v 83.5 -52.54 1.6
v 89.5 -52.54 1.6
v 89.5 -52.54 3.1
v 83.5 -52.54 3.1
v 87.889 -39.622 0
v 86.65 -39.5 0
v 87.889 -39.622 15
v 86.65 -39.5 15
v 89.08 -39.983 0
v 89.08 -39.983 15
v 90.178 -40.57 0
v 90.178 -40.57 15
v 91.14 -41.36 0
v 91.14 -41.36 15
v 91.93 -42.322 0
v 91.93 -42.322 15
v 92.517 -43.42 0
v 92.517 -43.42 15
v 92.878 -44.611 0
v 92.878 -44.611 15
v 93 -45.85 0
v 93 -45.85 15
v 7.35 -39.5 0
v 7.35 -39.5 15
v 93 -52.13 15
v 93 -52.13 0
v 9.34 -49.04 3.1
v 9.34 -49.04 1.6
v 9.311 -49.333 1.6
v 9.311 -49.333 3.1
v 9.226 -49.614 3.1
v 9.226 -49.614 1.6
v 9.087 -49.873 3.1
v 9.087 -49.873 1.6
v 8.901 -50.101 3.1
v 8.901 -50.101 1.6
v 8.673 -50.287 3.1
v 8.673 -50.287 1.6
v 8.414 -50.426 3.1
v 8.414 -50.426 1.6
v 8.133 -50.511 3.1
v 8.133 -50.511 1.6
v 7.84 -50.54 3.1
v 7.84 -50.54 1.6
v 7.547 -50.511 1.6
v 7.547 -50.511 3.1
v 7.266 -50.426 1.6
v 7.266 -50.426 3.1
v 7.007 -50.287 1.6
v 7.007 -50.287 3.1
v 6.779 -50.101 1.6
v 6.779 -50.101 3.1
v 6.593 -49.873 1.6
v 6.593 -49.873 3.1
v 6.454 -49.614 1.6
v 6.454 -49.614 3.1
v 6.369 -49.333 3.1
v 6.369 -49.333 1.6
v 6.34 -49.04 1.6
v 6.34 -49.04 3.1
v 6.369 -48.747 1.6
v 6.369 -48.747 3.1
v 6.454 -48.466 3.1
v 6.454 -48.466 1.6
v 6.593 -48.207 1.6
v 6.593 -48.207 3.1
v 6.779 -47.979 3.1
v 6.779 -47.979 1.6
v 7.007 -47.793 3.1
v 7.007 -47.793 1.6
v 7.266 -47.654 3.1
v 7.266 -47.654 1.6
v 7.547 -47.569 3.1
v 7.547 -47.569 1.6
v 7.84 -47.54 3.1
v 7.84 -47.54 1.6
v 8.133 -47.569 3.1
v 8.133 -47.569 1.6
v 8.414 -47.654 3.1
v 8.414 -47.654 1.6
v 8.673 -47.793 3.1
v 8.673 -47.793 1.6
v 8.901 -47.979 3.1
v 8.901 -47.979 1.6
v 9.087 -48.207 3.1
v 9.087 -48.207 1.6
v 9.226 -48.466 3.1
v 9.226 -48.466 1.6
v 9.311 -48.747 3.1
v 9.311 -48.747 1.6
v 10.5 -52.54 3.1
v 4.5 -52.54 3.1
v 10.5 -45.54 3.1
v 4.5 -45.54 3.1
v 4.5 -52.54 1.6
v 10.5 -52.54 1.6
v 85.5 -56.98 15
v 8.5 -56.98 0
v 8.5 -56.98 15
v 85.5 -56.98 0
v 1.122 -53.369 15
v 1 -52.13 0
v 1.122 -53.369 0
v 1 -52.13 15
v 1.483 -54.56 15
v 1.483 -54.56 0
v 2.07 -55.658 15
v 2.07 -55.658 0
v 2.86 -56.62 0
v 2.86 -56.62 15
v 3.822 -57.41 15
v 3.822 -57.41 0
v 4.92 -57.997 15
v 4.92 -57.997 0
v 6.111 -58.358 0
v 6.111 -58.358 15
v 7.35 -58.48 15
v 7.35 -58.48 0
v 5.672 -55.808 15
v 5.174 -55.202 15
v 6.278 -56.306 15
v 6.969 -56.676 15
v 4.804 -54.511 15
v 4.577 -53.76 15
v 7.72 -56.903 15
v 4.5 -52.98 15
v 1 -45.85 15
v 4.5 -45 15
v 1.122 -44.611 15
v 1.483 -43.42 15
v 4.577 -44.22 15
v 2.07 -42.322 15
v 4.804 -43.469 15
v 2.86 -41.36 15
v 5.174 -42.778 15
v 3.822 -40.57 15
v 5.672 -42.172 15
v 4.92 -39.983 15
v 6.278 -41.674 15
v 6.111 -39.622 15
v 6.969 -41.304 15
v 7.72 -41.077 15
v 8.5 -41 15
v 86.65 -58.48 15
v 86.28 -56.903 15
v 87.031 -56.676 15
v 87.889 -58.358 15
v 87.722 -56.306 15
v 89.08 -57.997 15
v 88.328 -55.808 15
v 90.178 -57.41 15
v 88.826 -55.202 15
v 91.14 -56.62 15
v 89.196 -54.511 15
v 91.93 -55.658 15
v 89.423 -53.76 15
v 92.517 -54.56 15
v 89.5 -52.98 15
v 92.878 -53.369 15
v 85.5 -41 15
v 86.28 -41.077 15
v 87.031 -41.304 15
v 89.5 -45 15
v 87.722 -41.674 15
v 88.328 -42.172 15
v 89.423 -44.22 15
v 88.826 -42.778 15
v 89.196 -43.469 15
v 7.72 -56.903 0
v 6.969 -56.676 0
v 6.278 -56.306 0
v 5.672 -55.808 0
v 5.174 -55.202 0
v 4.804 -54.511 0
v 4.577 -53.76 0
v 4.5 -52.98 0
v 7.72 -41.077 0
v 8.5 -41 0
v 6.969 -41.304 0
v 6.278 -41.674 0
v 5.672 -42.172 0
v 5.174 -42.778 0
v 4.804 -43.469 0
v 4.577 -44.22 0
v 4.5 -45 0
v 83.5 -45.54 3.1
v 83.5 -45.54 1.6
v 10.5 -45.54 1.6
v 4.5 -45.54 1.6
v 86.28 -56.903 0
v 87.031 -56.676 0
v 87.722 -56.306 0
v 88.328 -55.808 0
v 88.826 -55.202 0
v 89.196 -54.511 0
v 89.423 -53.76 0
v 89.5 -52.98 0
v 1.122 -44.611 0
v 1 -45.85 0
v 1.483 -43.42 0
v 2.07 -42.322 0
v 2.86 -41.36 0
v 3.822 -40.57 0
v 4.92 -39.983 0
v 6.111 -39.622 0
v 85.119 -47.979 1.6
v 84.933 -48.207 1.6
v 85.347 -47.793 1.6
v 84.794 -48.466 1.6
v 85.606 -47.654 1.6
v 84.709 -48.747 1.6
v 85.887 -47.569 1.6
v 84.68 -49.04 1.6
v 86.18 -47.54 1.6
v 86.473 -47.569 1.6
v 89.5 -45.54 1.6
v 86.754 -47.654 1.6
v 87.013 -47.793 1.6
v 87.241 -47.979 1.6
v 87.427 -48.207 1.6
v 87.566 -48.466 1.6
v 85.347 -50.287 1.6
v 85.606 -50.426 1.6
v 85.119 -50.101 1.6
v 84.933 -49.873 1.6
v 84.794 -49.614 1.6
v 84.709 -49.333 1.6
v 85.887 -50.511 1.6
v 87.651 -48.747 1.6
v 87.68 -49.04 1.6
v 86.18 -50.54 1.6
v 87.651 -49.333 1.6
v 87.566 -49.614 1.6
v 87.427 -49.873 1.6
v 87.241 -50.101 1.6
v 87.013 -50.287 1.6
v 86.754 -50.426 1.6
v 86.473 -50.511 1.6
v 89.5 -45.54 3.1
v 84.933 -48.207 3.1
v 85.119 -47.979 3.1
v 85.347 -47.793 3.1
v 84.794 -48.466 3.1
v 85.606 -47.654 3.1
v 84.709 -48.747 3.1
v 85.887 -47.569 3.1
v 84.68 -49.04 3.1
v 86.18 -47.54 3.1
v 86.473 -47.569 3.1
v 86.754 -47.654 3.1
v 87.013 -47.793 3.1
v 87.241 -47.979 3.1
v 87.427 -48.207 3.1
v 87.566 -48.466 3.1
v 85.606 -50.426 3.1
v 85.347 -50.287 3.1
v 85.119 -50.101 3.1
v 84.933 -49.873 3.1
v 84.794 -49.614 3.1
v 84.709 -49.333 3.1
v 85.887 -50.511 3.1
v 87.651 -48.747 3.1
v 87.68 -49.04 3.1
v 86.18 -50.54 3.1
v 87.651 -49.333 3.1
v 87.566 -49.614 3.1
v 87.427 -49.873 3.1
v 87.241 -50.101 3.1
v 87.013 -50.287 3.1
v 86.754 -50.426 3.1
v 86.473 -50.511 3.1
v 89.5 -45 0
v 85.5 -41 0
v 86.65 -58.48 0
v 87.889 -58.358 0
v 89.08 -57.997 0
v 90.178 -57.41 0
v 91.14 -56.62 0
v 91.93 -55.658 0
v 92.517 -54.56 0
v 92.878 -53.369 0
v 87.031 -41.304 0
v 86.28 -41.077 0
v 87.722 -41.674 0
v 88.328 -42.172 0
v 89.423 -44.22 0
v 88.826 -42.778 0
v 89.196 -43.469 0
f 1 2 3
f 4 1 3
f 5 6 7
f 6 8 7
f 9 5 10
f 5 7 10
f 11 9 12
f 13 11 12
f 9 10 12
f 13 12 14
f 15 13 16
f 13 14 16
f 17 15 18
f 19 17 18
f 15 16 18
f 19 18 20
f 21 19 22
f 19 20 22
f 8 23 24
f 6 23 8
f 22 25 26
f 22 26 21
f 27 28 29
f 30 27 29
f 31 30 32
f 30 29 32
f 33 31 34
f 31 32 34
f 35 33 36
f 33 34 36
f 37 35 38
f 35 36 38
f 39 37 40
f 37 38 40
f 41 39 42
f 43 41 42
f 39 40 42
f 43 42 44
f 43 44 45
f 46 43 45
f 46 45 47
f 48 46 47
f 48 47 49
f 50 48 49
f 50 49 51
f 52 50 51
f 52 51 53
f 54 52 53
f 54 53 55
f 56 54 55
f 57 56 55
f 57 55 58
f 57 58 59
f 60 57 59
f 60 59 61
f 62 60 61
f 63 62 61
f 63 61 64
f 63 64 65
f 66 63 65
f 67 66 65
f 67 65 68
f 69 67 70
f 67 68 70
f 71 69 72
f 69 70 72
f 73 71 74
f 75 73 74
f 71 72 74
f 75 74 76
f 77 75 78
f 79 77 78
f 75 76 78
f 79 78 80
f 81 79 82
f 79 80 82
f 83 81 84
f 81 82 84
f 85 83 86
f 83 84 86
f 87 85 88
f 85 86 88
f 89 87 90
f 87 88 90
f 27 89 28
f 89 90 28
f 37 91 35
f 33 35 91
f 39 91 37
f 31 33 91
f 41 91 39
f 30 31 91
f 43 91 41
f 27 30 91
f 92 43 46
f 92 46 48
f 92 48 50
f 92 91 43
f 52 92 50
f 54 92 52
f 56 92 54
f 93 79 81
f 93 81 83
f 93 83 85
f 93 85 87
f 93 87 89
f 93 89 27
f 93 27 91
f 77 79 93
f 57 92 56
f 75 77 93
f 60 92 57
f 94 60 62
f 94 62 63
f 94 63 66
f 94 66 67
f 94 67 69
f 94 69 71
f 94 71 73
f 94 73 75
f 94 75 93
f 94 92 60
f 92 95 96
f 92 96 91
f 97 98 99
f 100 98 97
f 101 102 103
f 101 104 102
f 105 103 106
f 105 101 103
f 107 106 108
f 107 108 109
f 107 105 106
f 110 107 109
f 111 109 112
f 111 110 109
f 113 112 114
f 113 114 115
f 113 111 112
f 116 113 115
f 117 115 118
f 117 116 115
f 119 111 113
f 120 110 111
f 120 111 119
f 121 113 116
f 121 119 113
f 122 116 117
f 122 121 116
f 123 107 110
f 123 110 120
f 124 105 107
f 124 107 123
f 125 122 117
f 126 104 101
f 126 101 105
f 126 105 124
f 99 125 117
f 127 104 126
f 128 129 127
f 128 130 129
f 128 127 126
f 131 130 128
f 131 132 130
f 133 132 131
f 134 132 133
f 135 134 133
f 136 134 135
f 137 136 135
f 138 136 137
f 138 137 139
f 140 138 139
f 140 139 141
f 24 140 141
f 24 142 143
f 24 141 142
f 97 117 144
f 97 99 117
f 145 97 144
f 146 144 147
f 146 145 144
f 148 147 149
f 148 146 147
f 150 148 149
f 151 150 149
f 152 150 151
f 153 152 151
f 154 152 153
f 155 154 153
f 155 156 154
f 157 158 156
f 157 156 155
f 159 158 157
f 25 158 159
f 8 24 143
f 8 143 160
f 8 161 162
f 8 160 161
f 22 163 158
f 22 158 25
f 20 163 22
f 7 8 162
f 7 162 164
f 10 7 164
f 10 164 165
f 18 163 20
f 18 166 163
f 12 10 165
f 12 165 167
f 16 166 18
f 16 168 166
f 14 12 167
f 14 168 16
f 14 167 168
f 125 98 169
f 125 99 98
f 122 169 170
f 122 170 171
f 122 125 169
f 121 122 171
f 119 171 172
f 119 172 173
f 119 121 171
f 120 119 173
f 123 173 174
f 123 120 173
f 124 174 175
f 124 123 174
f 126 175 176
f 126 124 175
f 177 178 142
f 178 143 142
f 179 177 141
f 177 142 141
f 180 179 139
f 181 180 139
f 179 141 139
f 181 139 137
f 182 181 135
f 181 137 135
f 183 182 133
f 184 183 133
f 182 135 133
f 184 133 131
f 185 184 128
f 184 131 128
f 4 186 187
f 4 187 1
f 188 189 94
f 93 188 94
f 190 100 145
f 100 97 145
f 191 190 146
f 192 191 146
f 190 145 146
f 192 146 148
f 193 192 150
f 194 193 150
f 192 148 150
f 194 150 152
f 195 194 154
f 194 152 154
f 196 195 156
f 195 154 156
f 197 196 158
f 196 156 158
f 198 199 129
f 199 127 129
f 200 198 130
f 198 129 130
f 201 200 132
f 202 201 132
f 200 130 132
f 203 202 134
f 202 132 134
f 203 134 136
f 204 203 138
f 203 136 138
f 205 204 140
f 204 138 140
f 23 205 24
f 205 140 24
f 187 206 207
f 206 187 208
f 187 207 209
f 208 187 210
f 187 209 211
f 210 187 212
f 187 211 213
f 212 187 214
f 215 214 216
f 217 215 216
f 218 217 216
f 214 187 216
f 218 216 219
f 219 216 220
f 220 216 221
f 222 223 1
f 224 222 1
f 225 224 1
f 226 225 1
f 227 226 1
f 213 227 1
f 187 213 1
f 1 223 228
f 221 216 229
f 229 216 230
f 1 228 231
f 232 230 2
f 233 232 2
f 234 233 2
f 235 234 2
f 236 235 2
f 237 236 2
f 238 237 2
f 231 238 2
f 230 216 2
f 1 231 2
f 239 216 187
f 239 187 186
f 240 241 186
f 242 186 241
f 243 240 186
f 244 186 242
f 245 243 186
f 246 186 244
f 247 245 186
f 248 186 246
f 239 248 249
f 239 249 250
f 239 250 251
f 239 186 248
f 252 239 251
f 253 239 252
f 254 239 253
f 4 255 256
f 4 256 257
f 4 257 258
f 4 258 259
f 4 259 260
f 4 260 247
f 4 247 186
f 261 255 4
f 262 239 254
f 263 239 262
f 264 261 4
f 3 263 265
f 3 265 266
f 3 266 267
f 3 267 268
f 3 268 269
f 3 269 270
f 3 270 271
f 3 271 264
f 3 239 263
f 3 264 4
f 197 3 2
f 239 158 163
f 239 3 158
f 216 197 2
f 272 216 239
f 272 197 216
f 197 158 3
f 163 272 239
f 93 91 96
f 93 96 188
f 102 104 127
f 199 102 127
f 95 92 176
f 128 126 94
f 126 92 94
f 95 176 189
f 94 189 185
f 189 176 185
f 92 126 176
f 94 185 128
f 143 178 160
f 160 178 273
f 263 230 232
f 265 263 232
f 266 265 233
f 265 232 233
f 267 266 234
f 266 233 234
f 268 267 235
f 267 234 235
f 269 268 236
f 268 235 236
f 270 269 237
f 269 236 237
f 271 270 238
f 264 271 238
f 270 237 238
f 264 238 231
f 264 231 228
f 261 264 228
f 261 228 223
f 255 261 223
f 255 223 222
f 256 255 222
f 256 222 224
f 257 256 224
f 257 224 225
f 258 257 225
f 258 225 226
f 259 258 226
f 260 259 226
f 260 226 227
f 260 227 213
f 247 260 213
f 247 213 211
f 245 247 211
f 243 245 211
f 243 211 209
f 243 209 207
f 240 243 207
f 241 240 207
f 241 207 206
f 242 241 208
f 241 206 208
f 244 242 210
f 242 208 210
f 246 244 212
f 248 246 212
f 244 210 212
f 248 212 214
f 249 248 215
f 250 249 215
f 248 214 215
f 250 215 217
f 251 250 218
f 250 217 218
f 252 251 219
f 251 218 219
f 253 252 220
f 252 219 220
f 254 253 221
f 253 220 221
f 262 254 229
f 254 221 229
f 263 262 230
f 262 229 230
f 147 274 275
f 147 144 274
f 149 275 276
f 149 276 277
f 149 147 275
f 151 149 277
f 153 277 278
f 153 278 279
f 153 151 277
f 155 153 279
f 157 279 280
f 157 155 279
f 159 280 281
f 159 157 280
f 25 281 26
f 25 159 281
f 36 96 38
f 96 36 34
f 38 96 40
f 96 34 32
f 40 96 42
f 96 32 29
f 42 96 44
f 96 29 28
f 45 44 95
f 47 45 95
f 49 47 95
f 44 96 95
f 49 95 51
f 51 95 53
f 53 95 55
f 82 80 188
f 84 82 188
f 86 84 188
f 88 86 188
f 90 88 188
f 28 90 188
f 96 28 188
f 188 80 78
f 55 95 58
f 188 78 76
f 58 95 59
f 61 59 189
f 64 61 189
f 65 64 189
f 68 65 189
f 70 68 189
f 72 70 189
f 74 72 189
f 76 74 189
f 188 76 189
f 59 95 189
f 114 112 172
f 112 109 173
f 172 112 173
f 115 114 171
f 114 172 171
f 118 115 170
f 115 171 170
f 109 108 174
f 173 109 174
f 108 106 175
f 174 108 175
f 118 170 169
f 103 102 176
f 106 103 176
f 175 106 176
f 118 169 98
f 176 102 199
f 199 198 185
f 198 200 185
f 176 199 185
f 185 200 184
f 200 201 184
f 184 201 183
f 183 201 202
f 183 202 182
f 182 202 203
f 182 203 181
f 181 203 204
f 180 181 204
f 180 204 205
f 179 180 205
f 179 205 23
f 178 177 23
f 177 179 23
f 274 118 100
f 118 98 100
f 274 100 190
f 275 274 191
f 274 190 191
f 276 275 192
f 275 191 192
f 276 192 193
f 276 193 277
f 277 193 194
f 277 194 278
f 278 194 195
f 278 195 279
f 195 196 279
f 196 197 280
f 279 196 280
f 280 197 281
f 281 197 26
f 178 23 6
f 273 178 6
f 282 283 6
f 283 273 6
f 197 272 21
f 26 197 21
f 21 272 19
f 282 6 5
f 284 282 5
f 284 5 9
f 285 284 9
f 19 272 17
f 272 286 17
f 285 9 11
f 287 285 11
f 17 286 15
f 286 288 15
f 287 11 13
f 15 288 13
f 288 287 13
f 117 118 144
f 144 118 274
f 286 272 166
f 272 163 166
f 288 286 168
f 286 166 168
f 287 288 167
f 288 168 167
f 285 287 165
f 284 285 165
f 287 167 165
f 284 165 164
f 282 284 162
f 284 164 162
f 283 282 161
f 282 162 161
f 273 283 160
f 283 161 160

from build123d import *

# Parameters (mm, degrees)
SKETCH001_W   = 92
SKETCH001_H   = 18.98
SKETCH001_W_2 = 85
SKETCH001_H_2 = 15.98
PAD001_DEPTH  = 15
FILLET001_R   = 4
FILLET002_R   = 6.35
SKETCH080_W   = 7
SKETCH080_H   = 1.5
PAD002_DEPTH  = 6
SKETCH081_W   = 7
SKETCH081_H   = 1.5
PAD003_DEPTH  = 6
SKETCH082_R   = 1.5
POCKET_DEPTH  = 5


with BuildPart() as part:
    # Sketch001 → Pad001 (new body)
    with BuildSketch(Plane.XY):
        with Locations((47, -48.990001)):
            Rectangle(SKETCH001_W, SKETCH001_H)
        with Locations((47, -48.990001)):
            Rectangle(SKETCH001_W_2, SKETCH001_H_2, mode=Mode.SUBTRACT)
    extrude(amount=PAD001_DEPTH)

    # Fillet001
    fillet001_edges = [part.edges().sort_by_distance(p)[0] for p in [
        (4.5, -41.000001, 7.5),
        (89.5, -41.000001, 7.5),
        (89.5, -56.980001, 7.5),
        (4.5, -56.980001, 7.5),
    ]]
    fillet(fillet001_edges, radius=FILLET001_R)

    # Fillet002
    fillet002_edges = [part.edges().sort_by_distance(p)[0] for p in [
        (1, -39.500001, 7.5),
        (1, -58.480001, 7.5),
        (93, -39.500001, 7.5),
        (93, -58.480001, 7.5),
    ]]
    fillet(fillet002_edges, radius=FILLET002_R)

    # Sketch080 (on Face13 of Fillet002) → Pad002 (join)
    with BuildSketch(Plane(origin=(89.5, 0, 0), x_dir=(0, -1, 0), z_dir=(-1, 0, 0))):
        with Locations((49.039999, 2.35)):
            Rectangle(SKETCH080_W, SKETCH080_H)
    extrude(amount=PAD002_DEPTH)

    # Sketch081 (on Face14 of Pad002) → Pad003 (join)
    with BuildSketch(Plane.YZ.offset(4.5)):
        with Locations((-49.039999, 2.35)):
            Rectangle(SKETCH081_W, SKETCH081_H)
    extrude(amount=PAD003_DEPTH)

    # Sketch082 (on Face1 of Pad003) → Pocket (cut)
    with BuildSketch(Plane(origin=(0, 0, 0), x_dir=(1, 0, 0), z_dir=(0, 0, -1))):
        with Locations((7.84, 49.039999)):
            Circle(SKETCH082_R)
        with Locations((86.180001, 49.039999)):
            Circle(SKETCH082_R)
    extrude(amount=-POCKET_DEPTH, mode=Mode.SUBTRACT)


solid = part.part
